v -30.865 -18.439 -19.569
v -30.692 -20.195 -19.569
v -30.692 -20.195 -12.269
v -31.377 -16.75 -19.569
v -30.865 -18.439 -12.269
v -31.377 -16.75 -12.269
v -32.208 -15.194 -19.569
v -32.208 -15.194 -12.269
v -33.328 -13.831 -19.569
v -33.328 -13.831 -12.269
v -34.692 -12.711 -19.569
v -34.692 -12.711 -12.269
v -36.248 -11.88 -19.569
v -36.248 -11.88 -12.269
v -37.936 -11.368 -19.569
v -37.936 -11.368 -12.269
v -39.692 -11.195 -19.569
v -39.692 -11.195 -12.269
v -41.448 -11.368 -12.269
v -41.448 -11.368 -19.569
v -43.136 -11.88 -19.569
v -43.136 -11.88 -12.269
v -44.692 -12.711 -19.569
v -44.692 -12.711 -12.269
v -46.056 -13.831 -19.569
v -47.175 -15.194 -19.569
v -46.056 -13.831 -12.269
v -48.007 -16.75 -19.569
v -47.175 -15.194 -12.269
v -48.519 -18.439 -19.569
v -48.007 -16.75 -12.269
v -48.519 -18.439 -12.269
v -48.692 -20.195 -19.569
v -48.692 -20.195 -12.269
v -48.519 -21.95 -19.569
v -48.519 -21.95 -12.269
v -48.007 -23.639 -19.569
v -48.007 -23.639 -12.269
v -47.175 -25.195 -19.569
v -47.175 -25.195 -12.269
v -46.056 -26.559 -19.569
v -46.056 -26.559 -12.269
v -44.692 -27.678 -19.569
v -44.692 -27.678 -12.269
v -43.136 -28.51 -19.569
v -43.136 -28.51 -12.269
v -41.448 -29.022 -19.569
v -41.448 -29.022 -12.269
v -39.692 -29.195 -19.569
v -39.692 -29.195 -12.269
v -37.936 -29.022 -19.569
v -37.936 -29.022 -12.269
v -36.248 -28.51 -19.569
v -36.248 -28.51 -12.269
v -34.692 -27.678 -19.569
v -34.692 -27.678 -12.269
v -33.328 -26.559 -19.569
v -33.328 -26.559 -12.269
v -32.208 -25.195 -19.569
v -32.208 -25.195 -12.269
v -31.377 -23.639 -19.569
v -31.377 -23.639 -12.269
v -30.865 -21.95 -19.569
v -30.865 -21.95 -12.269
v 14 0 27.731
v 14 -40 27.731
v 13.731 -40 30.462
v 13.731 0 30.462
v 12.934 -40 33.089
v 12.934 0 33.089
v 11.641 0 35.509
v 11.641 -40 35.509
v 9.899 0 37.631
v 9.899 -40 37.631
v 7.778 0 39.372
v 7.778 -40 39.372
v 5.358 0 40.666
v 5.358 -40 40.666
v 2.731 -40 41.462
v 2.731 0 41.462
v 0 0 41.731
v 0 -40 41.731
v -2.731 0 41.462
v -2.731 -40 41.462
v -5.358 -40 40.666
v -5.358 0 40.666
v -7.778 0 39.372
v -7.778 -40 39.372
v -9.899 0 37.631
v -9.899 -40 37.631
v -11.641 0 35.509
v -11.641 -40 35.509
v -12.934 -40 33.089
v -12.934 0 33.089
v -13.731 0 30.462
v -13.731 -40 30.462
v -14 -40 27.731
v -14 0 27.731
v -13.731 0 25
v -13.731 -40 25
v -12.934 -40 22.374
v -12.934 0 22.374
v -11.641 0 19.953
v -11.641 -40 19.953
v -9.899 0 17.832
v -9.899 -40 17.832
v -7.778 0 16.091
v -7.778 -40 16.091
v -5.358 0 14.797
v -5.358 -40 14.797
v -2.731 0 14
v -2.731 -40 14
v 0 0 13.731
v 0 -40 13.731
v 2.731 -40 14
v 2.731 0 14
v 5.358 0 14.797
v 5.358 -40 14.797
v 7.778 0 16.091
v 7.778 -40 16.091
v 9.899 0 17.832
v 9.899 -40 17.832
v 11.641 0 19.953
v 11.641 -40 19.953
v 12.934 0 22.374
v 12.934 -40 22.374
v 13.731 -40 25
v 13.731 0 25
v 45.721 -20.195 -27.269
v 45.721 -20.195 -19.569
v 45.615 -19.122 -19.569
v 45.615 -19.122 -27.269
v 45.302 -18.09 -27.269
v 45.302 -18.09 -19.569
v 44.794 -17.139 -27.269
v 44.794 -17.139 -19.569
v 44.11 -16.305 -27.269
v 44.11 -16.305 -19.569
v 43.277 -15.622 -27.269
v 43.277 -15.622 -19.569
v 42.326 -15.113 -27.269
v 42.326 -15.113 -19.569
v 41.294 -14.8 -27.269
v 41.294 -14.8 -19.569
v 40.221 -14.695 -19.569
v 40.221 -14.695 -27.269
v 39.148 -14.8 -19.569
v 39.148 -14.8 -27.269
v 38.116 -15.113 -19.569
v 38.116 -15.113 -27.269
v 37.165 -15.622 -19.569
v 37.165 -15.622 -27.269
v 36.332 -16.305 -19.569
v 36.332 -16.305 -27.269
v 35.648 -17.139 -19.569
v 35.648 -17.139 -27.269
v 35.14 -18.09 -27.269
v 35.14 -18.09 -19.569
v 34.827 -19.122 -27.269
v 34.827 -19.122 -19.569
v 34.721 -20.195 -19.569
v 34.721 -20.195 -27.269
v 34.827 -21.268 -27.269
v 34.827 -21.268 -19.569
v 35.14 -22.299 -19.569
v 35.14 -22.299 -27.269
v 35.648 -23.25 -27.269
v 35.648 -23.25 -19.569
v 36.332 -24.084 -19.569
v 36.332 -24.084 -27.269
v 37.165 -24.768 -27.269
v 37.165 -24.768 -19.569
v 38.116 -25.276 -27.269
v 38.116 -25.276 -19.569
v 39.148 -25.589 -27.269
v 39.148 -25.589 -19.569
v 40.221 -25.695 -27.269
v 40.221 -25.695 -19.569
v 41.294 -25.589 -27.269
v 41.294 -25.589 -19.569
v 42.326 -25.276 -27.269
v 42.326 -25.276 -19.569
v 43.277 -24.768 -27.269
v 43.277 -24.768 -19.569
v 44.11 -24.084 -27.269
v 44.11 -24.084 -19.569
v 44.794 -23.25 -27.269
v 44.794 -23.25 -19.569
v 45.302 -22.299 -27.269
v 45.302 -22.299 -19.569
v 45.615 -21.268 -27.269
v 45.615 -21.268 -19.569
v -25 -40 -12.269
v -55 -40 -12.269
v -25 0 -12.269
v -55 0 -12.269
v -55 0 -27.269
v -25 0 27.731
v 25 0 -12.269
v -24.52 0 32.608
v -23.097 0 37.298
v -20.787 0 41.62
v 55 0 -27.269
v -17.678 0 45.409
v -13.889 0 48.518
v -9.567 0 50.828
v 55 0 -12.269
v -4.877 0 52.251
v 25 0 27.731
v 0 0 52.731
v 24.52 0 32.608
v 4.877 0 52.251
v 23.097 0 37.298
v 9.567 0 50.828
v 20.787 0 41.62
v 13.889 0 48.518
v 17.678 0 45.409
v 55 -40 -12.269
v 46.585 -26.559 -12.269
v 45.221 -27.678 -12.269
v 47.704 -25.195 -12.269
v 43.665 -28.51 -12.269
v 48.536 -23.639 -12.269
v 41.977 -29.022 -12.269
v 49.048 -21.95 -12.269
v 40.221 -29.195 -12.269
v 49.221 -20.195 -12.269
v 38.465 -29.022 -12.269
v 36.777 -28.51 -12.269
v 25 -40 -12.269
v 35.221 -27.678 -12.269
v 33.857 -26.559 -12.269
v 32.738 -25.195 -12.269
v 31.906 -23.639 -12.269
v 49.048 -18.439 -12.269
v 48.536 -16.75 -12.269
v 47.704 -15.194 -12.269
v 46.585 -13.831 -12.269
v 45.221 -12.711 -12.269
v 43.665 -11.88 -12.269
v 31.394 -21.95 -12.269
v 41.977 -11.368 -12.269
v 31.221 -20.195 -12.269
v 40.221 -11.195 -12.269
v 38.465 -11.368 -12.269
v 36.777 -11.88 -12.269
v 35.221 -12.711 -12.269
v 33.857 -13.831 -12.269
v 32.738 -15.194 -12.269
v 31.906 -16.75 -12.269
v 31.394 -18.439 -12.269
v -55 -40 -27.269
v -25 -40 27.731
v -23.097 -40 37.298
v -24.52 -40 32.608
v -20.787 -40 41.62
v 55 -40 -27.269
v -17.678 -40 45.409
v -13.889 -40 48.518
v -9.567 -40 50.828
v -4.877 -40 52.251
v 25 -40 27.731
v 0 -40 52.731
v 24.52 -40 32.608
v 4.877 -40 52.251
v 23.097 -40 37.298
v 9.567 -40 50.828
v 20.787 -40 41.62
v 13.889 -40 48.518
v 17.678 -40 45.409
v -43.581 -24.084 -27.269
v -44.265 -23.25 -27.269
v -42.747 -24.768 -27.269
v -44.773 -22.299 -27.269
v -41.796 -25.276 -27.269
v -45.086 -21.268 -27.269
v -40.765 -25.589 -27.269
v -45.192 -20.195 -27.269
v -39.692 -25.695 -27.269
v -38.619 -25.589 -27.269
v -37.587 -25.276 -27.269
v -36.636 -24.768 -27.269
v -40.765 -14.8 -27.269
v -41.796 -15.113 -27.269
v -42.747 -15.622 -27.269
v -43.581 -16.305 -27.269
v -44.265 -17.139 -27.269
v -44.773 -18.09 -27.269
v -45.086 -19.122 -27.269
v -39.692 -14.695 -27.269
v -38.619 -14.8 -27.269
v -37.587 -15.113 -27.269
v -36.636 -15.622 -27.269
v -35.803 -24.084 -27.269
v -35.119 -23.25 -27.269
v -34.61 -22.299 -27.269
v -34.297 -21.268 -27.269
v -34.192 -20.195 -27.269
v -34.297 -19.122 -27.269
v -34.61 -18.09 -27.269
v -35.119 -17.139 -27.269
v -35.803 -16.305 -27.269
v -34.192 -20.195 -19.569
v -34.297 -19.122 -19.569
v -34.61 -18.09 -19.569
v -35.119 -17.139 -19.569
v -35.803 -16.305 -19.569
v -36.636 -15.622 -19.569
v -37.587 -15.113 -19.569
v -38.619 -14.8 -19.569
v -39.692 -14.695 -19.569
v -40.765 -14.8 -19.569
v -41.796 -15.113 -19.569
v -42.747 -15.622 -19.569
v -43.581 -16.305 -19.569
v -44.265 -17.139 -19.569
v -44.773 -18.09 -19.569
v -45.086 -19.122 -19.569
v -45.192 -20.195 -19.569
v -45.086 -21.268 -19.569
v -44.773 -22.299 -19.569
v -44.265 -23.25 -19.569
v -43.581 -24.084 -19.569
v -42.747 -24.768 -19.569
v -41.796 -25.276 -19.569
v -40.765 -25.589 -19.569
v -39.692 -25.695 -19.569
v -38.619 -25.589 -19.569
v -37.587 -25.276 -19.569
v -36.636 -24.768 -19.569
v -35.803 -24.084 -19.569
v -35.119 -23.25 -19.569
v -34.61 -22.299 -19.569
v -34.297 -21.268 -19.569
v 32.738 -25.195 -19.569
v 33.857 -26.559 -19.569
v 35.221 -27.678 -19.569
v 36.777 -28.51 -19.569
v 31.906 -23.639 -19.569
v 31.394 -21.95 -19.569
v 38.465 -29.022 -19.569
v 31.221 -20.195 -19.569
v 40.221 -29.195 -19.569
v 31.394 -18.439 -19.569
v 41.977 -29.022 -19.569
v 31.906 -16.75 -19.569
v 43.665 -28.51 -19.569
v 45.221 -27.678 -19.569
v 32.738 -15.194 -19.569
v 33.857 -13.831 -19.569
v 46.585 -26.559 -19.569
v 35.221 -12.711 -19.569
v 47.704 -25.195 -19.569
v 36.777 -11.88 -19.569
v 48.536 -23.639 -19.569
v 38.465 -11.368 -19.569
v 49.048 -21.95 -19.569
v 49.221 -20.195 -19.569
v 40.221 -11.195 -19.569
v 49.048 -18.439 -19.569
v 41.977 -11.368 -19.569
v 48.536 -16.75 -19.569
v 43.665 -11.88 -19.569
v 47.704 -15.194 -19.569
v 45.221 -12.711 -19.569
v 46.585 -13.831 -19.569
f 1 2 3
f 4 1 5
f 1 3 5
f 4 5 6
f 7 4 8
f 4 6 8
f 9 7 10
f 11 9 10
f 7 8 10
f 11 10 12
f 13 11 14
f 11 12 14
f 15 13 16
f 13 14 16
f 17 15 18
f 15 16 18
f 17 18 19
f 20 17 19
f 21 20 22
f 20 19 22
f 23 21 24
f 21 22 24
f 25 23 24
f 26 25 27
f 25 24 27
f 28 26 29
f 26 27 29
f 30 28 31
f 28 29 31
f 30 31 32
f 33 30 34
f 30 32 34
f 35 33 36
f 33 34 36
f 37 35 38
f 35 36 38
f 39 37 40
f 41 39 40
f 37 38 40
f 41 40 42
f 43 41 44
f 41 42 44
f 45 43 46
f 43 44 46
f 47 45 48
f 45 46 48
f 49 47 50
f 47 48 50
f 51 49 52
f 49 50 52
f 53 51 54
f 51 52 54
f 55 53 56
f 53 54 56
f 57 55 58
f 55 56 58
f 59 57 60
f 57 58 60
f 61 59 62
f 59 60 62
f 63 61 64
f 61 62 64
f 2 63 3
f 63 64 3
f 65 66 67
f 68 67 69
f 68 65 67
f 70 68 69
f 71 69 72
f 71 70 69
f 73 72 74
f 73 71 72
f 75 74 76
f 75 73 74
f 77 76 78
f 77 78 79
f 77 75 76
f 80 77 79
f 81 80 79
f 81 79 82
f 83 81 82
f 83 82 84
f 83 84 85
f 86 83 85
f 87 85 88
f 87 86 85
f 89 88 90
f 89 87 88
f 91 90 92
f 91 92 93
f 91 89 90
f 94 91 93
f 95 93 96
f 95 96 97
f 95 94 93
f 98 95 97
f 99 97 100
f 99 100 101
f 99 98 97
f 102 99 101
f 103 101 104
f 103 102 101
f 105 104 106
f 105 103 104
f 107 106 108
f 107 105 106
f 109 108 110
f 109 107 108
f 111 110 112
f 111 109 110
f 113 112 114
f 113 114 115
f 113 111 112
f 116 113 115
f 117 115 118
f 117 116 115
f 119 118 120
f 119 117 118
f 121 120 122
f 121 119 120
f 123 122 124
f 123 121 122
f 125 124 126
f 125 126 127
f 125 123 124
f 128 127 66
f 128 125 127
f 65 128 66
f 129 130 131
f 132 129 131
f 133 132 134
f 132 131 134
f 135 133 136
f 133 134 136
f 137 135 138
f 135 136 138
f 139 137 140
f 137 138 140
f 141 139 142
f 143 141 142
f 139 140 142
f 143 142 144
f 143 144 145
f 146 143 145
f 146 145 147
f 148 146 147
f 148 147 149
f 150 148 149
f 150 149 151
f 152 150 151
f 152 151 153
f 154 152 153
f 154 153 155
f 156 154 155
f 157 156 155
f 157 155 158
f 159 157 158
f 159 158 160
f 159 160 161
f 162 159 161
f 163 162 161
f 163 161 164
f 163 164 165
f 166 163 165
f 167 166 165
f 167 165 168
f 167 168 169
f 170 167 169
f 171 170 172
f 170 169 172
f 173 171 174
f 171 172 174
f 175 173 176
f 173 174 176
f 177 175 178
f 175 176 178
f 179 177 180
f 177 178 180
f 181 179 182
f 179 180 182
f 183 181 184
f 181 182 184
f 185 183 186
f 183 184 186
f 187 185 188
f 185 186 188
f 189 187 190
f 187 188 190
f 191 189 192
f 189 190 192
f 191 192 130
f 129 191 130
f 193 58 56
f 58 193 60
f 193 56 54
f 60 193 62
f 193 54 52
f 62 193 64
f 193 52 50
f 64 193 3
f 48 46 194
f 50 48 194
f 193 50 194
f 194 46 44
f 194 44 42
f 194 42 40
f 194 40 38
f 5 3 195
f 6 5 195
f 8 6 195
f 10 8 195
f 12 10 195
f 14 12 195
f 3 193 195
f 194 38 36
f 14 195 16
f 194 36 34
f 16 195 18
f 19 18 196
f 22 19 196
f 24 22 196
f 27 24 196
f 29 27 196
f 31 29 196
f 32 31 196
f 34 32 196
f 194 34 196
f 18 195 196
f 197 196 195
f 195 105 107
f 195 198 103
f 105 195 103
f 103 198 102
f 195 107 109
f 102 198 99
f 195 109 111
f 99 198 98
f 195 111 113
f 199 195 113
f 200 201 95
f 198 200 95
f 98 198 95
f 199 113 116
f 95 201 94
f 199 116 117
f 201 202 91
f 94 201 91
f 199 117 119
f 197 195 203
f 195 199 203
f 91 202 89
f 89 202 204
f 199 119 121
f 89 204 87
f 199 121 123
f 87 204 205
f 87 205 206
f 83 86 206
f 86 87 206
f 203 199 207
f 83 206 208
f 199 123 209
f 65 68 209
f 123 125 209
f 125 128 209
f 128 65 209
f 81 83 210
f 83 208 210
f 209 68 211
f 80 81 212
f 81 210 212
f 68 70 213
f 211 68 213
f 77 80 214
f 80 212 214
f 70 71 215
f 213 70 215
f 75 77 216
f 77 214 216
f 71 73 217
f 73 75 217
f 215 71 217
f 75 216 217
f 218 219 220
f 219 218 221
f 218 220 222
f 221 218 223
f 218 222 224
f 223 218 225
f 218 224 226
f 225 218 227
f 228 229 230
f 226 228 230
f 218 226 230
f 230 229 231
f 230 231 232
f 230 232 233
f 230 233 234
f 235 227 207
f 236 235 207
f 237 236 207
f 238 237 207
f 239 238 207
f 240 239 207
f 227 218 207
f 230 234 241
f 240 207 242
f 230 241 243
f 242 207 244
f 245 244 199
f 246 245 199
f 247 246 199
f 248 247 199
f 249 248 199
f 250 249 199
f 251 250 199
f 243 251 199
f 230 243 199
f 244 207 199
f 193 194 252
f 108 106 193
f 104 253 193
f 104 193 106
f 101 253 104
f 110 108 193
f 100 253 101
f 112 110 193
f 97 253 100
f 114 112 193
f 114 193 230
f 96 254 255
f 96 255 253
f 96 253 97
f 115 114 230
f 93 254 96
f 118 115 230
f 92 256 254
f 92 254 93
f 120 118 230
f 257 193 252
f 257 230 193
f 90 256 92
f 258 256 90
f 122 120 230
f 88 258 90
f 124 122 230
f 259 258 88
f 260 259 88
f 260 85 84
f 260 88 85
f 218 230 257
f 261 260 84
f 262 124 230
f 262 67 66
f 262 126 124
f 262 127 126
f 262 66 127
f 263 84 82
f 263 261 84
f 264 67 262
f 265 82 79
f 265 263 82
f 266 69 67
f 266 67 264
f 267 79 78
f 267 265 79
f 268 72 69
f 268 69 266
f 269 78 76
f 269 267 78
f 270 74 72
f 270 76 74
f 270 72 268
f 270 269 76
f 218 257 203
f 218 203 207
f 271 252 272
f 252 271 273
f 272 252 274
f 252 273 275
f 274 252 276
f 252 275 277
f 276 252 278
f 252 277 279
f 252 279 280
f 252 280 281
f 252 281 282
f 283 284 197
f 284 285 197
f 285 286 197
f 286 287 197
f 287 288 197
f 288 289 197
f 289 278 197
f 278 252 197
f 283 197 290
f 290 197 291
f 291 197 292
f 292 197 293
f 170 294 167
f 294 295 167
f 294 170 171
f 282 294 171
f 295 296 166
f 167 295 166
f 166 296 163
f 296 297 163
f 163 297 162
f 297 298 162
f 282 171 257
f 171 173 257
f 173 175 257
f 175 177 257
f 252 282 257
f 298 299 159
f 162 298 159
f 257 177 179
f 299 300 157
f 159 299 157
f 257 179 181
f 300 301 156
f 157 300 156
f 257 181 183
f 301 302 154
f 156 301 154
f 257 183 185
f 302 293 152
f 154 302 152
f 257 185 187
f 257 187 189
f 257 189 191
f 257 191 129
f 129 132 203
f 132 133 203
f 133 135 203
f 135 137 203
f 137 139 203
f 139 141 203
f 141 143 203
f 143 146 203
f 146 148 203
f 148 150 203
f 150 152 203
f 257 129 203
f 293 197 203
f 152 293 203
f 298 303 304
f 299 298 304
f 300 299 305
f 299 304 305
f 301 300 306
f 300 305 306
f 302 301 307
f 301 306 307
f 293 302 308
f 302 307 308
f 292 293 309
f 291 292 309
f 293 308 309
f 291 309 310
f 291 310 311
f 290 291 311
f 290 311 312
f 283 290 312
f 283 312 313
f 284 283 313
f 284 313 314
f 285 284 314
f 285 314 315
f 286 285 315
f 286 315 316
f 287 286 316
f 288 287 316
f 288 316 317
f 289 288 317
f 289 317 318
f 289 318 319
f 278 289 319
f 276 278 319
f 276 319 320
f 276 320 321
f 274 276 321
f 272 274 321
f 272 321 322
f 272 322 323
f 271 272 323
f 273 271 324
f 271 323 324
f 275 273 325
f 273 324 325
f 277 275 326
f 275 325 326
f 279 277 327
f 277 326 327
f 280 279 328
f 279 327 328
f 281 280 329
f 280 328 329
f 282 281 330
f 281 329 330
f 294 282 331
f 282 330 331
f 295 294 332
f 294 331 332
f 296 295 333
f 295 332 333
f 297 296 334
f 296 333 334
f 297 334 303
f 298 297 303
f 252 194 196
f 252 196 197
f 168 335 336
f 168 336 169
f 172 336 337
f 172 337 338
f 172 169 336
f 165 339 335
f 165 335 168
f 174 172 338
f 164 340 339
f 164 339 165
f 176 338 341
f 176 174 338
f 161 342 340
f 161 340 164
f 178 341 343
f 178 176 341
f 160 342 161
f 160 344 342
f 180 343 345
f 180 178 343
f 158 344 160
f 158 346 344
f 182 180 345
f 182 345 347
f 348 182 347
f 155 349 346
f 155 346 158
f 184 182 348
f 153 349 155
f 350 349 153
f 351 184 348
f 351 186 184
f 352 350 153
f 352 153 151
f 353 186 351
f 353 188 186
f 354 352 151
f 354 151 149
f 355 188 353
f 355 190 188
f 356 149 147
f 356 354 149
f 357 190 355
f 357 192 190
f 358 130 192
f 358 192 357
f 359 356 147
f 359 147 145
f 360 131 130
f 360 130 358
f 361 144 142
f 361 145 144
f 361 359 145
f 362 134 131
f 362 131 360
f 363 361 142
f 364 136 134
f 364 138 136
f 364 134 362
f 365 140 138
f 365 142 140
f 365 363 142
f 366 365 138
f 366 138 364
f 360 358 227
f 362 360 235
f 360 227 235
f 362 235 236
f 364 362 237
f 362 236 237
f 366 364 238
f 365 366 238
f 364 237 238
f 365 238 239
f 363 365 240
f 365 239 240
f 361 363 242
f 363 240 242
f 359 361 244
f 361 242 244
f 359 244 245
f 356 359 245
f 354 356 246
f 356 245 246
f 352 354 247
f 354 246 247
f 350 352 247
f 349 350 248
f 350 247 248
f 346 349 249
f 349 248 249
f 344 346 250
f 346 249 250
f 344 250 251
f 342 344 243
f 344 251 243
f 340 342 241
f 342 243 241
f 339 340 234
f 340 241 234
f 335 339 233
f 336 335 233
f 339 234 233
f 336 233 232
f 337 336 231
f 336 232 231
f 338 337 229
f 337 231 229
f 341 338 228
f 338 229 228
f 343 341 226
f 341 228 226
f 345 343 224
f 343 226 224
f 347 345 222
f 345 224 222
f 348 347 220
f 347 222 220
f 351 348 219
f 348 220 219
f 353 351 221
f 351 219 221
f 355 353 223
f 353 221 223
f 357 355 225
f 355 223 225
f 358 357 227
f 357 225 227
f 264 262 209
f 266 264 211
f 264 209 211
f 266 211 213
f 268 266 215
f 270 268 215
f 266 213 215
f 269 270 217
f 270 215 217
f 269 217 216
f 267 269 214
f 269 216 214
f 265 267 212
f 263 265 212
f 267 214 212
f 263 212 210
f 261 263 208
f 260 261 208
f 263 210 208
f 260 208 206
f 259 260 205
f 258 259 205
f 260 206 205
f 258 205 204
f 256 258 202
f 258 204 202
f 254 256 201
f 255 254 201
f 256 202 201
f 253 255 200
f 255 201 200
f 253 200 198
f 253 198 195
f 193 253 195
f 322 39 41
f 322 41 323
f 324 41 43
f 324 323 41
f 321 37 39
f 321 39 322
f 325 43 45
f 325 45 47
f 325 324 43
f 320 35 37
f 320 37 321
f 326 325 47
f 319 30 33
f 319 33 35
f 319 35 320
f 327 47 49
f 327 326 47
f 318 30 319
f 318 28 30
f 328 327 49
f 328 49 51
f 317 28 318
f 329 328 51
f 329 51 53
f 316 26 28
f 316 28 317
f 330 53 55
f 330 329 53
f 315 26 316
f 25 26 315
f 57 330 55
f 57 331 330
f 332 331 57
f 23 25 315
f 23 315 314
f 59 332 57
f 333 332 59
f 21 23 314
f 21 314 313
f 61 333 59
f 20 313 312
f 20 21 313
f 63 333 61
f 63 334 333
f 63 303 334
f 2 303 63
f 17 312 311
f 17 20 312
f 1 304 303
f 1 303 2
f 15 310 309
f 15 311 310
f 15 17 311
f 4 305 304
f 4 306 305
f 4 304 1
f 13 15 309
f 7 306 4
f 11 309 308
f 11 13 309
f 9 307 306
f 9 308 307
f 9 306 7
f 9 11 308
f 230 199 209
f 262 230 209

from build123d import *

# Parameters (mm, degrees)
F0_R     = 14
F1_DEPTH = 40
F2_R     = 9
F2_R_2   = 5.5
F3_DEPTH = 7.3
F4_DEPTH = 15


with BuildPart() as f1:
    # F0 (on Front) → F1 (new body)
    with BuildSketch(Plane.XZ):
        with BuildLine():
            Line((-55, -27.2687692195), (0, -27.2687692195))
            Line((0, -27.2687692195), (55, -27.2687692195))
            Line((55, -27.2687692195), (55, -12.2687692195))
            Line((55, -12.2687692195), (25, -12.2687692195))
            Line((25, -12.2687692195), (25, 27.7312307805))
            ThreePointArc((25, 27.7312307805), (0, 52.7312307805), (-25, 27.7312307805))
            Line((-25, 27.7312307805), (-25, -12.2687692195))
            Line((-25, -12.2687692195), (-55, -12.2687692195))
            Line((-55, -12.2687692195), (-55, -27.2687692195))
        make_face()
        with Locations((0, 27.7312307805)):
            Circle(F0_R, mode=Mode.SUBTRACT)
    extrude(amount=F1_DEPTH)

    # F2 (on face) → F3 (cut)
    with BuildSketch(Plane.XY.offset(-12.2687692195)):
        with Locations((40.221106261, -20.1945845038)):
            Circle(F2_R)
        with Locations((40.221106261, -20.1945845038)):
            Circle(F2_R_2, mode=Mode.SUBTRACT)
        with Locations((-39.6916903555, -20.1945845038)):
            Circle(F2_R)
        with Locations((-39.6916903555, -20.1945845038)):
            Circle(F2_R_2, mode=Mode.SUBTRACT)
    extrude(amount=-F3_DEPTH, mode=Mode.SUBTRACT)

    # F4 (cut): faces of the model
    f4_faces = [f1.faces().sort_by_distance(p)[0] for p in [
        (-39.6916903555, -20.1945845038, -12.2687692195),
        (40.221106261, -20.1945845038, -12.2687692195),
    ]]
    extrude(f4_faces, amount=-F4_DEPTH, mode=Mode.SUBTRACT)


solid = f1.part
